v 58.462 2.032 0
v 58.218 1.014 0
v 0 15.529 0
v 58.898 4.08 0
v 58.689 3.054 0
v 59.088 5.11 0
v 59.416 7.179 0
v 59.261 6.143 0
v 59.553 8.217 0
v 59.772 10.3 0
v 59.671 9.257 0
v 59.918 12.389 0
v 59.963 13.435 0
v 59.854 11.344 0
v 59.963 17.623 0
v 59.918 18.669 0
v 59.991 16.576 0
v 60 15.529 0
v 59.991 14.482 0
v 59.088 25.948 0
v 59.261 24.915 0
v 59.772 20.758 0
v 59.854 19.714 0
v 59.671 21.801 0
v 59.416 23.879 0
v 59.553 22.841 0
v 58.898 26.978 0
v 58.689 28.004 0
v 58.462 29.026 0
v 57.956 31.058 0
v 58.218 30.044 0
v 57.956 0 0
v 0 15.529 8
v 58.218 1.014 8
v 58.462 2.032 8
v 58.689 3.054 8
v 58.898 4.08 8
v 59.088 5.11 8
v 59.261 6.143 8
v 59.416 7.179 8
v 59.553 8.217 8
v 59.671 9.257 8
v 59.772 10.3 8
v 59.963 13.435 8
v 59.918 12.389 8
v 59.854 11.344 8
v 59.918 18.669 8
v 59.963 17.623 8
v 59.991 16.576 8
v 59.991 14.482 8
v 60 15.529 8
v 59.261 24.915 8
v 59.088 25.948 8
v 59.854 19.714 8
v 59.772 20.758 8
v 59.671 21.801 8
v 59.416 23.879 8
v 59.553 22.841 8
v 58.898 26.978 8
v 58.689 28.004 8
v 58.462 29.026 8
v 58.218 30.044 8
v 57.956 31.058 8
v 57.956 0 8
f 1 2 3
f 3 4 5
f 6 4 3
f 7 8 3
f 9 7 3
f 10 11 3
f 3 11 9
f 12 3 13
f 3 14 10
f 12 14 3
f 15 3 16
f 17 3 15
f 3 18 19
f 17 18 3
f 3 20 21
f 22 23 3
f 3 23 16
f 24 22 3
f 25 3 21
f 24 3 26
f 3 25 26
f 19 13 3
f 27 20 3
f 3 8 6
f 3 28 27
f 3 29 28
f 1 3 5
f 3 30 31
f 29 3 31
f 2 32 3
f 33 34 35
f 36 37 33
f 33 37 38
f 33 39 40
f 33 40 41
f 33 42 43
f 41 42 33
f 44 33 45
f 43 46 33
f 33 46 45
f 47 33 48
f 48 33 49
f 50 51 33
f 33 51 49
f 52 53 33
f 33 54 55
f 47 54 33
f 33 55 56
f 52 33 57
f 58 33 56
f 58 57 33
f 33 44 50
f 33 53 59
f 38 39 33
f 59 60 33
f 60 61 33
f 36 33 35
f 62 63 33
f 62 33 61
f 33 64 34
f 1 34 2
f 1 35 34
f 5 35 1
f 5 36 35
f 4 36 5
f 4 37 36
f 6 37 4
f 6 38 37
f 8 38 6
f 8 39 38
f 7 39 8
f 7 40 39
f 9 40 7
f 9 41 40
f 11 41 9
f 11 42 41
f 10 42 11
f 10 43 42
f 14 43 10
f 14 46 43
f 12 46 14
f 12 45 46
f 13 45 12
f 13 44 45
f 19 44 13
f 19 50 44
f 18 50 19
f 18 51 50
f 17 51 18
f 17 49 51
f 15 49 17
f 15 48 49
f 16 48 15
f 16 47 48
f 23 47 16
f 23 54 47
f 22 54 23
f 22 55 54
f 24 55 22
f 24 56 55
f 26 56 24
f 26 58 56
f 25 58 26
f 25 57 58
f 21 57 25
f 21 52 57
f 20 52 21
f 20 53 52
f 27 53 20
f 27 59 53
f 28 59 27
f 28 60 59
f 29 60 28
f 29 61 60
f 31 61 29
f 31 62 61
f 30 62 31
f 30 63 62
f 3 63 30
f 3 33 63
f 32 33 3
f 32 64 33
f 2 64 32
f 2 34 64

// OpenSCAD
$fn = 32;

// ----------------------------------------------------------------------
// Arc profile plate: sector, 32 points
// ----------------------------------------------------------------------

// --- parameters (mm) ---
sector_angle = 30;        // sector angle, degrees
sector_r = 60;            // outer radius
arc_step = 1;             // sampling step of the arc, degrees
plate_t = 8;              // plate thickness, Z

bbox_x = 2 * sector_r * sin(sector_angle / 2);  // chord of the sector
bbox_y = sector_r;  // depth of the sector (apex to arc)

profile = [[57.956, 0], [58.218, 1.014], [58.462, 2.032], [58.689, 3.054], [58.898, 4.08], [59.088, 5.11], [59.261, 6.143], [59.416, 7.179], [59.553, 8.217], [59.671, 9.257], [59.772, 10.3], [59.854, 11.344], [59.918, 12.389], [59.963, 13.435], [59.991, 14.482], [60, 15.529], [59.991, 16.576], [59.963, 17.623], [59.918, 18.669], [59.854, 19.714], [59.772, 20.758], [59.671, 21.801], [59.553, 22.841], [59.416, 23.879], [59.261, 24.915], [59.088, 25.948], [58.898, 26.978], [58.689, 28.004], [58.462, 29.026], [58.218, 30.044], [57.956, 31.058], [0, 15.529]];  // primary outline, 32 points, counter clockwise

// --- the one profile operation ---
linear_extrude(height = plate_t) polygon(points = profile);
